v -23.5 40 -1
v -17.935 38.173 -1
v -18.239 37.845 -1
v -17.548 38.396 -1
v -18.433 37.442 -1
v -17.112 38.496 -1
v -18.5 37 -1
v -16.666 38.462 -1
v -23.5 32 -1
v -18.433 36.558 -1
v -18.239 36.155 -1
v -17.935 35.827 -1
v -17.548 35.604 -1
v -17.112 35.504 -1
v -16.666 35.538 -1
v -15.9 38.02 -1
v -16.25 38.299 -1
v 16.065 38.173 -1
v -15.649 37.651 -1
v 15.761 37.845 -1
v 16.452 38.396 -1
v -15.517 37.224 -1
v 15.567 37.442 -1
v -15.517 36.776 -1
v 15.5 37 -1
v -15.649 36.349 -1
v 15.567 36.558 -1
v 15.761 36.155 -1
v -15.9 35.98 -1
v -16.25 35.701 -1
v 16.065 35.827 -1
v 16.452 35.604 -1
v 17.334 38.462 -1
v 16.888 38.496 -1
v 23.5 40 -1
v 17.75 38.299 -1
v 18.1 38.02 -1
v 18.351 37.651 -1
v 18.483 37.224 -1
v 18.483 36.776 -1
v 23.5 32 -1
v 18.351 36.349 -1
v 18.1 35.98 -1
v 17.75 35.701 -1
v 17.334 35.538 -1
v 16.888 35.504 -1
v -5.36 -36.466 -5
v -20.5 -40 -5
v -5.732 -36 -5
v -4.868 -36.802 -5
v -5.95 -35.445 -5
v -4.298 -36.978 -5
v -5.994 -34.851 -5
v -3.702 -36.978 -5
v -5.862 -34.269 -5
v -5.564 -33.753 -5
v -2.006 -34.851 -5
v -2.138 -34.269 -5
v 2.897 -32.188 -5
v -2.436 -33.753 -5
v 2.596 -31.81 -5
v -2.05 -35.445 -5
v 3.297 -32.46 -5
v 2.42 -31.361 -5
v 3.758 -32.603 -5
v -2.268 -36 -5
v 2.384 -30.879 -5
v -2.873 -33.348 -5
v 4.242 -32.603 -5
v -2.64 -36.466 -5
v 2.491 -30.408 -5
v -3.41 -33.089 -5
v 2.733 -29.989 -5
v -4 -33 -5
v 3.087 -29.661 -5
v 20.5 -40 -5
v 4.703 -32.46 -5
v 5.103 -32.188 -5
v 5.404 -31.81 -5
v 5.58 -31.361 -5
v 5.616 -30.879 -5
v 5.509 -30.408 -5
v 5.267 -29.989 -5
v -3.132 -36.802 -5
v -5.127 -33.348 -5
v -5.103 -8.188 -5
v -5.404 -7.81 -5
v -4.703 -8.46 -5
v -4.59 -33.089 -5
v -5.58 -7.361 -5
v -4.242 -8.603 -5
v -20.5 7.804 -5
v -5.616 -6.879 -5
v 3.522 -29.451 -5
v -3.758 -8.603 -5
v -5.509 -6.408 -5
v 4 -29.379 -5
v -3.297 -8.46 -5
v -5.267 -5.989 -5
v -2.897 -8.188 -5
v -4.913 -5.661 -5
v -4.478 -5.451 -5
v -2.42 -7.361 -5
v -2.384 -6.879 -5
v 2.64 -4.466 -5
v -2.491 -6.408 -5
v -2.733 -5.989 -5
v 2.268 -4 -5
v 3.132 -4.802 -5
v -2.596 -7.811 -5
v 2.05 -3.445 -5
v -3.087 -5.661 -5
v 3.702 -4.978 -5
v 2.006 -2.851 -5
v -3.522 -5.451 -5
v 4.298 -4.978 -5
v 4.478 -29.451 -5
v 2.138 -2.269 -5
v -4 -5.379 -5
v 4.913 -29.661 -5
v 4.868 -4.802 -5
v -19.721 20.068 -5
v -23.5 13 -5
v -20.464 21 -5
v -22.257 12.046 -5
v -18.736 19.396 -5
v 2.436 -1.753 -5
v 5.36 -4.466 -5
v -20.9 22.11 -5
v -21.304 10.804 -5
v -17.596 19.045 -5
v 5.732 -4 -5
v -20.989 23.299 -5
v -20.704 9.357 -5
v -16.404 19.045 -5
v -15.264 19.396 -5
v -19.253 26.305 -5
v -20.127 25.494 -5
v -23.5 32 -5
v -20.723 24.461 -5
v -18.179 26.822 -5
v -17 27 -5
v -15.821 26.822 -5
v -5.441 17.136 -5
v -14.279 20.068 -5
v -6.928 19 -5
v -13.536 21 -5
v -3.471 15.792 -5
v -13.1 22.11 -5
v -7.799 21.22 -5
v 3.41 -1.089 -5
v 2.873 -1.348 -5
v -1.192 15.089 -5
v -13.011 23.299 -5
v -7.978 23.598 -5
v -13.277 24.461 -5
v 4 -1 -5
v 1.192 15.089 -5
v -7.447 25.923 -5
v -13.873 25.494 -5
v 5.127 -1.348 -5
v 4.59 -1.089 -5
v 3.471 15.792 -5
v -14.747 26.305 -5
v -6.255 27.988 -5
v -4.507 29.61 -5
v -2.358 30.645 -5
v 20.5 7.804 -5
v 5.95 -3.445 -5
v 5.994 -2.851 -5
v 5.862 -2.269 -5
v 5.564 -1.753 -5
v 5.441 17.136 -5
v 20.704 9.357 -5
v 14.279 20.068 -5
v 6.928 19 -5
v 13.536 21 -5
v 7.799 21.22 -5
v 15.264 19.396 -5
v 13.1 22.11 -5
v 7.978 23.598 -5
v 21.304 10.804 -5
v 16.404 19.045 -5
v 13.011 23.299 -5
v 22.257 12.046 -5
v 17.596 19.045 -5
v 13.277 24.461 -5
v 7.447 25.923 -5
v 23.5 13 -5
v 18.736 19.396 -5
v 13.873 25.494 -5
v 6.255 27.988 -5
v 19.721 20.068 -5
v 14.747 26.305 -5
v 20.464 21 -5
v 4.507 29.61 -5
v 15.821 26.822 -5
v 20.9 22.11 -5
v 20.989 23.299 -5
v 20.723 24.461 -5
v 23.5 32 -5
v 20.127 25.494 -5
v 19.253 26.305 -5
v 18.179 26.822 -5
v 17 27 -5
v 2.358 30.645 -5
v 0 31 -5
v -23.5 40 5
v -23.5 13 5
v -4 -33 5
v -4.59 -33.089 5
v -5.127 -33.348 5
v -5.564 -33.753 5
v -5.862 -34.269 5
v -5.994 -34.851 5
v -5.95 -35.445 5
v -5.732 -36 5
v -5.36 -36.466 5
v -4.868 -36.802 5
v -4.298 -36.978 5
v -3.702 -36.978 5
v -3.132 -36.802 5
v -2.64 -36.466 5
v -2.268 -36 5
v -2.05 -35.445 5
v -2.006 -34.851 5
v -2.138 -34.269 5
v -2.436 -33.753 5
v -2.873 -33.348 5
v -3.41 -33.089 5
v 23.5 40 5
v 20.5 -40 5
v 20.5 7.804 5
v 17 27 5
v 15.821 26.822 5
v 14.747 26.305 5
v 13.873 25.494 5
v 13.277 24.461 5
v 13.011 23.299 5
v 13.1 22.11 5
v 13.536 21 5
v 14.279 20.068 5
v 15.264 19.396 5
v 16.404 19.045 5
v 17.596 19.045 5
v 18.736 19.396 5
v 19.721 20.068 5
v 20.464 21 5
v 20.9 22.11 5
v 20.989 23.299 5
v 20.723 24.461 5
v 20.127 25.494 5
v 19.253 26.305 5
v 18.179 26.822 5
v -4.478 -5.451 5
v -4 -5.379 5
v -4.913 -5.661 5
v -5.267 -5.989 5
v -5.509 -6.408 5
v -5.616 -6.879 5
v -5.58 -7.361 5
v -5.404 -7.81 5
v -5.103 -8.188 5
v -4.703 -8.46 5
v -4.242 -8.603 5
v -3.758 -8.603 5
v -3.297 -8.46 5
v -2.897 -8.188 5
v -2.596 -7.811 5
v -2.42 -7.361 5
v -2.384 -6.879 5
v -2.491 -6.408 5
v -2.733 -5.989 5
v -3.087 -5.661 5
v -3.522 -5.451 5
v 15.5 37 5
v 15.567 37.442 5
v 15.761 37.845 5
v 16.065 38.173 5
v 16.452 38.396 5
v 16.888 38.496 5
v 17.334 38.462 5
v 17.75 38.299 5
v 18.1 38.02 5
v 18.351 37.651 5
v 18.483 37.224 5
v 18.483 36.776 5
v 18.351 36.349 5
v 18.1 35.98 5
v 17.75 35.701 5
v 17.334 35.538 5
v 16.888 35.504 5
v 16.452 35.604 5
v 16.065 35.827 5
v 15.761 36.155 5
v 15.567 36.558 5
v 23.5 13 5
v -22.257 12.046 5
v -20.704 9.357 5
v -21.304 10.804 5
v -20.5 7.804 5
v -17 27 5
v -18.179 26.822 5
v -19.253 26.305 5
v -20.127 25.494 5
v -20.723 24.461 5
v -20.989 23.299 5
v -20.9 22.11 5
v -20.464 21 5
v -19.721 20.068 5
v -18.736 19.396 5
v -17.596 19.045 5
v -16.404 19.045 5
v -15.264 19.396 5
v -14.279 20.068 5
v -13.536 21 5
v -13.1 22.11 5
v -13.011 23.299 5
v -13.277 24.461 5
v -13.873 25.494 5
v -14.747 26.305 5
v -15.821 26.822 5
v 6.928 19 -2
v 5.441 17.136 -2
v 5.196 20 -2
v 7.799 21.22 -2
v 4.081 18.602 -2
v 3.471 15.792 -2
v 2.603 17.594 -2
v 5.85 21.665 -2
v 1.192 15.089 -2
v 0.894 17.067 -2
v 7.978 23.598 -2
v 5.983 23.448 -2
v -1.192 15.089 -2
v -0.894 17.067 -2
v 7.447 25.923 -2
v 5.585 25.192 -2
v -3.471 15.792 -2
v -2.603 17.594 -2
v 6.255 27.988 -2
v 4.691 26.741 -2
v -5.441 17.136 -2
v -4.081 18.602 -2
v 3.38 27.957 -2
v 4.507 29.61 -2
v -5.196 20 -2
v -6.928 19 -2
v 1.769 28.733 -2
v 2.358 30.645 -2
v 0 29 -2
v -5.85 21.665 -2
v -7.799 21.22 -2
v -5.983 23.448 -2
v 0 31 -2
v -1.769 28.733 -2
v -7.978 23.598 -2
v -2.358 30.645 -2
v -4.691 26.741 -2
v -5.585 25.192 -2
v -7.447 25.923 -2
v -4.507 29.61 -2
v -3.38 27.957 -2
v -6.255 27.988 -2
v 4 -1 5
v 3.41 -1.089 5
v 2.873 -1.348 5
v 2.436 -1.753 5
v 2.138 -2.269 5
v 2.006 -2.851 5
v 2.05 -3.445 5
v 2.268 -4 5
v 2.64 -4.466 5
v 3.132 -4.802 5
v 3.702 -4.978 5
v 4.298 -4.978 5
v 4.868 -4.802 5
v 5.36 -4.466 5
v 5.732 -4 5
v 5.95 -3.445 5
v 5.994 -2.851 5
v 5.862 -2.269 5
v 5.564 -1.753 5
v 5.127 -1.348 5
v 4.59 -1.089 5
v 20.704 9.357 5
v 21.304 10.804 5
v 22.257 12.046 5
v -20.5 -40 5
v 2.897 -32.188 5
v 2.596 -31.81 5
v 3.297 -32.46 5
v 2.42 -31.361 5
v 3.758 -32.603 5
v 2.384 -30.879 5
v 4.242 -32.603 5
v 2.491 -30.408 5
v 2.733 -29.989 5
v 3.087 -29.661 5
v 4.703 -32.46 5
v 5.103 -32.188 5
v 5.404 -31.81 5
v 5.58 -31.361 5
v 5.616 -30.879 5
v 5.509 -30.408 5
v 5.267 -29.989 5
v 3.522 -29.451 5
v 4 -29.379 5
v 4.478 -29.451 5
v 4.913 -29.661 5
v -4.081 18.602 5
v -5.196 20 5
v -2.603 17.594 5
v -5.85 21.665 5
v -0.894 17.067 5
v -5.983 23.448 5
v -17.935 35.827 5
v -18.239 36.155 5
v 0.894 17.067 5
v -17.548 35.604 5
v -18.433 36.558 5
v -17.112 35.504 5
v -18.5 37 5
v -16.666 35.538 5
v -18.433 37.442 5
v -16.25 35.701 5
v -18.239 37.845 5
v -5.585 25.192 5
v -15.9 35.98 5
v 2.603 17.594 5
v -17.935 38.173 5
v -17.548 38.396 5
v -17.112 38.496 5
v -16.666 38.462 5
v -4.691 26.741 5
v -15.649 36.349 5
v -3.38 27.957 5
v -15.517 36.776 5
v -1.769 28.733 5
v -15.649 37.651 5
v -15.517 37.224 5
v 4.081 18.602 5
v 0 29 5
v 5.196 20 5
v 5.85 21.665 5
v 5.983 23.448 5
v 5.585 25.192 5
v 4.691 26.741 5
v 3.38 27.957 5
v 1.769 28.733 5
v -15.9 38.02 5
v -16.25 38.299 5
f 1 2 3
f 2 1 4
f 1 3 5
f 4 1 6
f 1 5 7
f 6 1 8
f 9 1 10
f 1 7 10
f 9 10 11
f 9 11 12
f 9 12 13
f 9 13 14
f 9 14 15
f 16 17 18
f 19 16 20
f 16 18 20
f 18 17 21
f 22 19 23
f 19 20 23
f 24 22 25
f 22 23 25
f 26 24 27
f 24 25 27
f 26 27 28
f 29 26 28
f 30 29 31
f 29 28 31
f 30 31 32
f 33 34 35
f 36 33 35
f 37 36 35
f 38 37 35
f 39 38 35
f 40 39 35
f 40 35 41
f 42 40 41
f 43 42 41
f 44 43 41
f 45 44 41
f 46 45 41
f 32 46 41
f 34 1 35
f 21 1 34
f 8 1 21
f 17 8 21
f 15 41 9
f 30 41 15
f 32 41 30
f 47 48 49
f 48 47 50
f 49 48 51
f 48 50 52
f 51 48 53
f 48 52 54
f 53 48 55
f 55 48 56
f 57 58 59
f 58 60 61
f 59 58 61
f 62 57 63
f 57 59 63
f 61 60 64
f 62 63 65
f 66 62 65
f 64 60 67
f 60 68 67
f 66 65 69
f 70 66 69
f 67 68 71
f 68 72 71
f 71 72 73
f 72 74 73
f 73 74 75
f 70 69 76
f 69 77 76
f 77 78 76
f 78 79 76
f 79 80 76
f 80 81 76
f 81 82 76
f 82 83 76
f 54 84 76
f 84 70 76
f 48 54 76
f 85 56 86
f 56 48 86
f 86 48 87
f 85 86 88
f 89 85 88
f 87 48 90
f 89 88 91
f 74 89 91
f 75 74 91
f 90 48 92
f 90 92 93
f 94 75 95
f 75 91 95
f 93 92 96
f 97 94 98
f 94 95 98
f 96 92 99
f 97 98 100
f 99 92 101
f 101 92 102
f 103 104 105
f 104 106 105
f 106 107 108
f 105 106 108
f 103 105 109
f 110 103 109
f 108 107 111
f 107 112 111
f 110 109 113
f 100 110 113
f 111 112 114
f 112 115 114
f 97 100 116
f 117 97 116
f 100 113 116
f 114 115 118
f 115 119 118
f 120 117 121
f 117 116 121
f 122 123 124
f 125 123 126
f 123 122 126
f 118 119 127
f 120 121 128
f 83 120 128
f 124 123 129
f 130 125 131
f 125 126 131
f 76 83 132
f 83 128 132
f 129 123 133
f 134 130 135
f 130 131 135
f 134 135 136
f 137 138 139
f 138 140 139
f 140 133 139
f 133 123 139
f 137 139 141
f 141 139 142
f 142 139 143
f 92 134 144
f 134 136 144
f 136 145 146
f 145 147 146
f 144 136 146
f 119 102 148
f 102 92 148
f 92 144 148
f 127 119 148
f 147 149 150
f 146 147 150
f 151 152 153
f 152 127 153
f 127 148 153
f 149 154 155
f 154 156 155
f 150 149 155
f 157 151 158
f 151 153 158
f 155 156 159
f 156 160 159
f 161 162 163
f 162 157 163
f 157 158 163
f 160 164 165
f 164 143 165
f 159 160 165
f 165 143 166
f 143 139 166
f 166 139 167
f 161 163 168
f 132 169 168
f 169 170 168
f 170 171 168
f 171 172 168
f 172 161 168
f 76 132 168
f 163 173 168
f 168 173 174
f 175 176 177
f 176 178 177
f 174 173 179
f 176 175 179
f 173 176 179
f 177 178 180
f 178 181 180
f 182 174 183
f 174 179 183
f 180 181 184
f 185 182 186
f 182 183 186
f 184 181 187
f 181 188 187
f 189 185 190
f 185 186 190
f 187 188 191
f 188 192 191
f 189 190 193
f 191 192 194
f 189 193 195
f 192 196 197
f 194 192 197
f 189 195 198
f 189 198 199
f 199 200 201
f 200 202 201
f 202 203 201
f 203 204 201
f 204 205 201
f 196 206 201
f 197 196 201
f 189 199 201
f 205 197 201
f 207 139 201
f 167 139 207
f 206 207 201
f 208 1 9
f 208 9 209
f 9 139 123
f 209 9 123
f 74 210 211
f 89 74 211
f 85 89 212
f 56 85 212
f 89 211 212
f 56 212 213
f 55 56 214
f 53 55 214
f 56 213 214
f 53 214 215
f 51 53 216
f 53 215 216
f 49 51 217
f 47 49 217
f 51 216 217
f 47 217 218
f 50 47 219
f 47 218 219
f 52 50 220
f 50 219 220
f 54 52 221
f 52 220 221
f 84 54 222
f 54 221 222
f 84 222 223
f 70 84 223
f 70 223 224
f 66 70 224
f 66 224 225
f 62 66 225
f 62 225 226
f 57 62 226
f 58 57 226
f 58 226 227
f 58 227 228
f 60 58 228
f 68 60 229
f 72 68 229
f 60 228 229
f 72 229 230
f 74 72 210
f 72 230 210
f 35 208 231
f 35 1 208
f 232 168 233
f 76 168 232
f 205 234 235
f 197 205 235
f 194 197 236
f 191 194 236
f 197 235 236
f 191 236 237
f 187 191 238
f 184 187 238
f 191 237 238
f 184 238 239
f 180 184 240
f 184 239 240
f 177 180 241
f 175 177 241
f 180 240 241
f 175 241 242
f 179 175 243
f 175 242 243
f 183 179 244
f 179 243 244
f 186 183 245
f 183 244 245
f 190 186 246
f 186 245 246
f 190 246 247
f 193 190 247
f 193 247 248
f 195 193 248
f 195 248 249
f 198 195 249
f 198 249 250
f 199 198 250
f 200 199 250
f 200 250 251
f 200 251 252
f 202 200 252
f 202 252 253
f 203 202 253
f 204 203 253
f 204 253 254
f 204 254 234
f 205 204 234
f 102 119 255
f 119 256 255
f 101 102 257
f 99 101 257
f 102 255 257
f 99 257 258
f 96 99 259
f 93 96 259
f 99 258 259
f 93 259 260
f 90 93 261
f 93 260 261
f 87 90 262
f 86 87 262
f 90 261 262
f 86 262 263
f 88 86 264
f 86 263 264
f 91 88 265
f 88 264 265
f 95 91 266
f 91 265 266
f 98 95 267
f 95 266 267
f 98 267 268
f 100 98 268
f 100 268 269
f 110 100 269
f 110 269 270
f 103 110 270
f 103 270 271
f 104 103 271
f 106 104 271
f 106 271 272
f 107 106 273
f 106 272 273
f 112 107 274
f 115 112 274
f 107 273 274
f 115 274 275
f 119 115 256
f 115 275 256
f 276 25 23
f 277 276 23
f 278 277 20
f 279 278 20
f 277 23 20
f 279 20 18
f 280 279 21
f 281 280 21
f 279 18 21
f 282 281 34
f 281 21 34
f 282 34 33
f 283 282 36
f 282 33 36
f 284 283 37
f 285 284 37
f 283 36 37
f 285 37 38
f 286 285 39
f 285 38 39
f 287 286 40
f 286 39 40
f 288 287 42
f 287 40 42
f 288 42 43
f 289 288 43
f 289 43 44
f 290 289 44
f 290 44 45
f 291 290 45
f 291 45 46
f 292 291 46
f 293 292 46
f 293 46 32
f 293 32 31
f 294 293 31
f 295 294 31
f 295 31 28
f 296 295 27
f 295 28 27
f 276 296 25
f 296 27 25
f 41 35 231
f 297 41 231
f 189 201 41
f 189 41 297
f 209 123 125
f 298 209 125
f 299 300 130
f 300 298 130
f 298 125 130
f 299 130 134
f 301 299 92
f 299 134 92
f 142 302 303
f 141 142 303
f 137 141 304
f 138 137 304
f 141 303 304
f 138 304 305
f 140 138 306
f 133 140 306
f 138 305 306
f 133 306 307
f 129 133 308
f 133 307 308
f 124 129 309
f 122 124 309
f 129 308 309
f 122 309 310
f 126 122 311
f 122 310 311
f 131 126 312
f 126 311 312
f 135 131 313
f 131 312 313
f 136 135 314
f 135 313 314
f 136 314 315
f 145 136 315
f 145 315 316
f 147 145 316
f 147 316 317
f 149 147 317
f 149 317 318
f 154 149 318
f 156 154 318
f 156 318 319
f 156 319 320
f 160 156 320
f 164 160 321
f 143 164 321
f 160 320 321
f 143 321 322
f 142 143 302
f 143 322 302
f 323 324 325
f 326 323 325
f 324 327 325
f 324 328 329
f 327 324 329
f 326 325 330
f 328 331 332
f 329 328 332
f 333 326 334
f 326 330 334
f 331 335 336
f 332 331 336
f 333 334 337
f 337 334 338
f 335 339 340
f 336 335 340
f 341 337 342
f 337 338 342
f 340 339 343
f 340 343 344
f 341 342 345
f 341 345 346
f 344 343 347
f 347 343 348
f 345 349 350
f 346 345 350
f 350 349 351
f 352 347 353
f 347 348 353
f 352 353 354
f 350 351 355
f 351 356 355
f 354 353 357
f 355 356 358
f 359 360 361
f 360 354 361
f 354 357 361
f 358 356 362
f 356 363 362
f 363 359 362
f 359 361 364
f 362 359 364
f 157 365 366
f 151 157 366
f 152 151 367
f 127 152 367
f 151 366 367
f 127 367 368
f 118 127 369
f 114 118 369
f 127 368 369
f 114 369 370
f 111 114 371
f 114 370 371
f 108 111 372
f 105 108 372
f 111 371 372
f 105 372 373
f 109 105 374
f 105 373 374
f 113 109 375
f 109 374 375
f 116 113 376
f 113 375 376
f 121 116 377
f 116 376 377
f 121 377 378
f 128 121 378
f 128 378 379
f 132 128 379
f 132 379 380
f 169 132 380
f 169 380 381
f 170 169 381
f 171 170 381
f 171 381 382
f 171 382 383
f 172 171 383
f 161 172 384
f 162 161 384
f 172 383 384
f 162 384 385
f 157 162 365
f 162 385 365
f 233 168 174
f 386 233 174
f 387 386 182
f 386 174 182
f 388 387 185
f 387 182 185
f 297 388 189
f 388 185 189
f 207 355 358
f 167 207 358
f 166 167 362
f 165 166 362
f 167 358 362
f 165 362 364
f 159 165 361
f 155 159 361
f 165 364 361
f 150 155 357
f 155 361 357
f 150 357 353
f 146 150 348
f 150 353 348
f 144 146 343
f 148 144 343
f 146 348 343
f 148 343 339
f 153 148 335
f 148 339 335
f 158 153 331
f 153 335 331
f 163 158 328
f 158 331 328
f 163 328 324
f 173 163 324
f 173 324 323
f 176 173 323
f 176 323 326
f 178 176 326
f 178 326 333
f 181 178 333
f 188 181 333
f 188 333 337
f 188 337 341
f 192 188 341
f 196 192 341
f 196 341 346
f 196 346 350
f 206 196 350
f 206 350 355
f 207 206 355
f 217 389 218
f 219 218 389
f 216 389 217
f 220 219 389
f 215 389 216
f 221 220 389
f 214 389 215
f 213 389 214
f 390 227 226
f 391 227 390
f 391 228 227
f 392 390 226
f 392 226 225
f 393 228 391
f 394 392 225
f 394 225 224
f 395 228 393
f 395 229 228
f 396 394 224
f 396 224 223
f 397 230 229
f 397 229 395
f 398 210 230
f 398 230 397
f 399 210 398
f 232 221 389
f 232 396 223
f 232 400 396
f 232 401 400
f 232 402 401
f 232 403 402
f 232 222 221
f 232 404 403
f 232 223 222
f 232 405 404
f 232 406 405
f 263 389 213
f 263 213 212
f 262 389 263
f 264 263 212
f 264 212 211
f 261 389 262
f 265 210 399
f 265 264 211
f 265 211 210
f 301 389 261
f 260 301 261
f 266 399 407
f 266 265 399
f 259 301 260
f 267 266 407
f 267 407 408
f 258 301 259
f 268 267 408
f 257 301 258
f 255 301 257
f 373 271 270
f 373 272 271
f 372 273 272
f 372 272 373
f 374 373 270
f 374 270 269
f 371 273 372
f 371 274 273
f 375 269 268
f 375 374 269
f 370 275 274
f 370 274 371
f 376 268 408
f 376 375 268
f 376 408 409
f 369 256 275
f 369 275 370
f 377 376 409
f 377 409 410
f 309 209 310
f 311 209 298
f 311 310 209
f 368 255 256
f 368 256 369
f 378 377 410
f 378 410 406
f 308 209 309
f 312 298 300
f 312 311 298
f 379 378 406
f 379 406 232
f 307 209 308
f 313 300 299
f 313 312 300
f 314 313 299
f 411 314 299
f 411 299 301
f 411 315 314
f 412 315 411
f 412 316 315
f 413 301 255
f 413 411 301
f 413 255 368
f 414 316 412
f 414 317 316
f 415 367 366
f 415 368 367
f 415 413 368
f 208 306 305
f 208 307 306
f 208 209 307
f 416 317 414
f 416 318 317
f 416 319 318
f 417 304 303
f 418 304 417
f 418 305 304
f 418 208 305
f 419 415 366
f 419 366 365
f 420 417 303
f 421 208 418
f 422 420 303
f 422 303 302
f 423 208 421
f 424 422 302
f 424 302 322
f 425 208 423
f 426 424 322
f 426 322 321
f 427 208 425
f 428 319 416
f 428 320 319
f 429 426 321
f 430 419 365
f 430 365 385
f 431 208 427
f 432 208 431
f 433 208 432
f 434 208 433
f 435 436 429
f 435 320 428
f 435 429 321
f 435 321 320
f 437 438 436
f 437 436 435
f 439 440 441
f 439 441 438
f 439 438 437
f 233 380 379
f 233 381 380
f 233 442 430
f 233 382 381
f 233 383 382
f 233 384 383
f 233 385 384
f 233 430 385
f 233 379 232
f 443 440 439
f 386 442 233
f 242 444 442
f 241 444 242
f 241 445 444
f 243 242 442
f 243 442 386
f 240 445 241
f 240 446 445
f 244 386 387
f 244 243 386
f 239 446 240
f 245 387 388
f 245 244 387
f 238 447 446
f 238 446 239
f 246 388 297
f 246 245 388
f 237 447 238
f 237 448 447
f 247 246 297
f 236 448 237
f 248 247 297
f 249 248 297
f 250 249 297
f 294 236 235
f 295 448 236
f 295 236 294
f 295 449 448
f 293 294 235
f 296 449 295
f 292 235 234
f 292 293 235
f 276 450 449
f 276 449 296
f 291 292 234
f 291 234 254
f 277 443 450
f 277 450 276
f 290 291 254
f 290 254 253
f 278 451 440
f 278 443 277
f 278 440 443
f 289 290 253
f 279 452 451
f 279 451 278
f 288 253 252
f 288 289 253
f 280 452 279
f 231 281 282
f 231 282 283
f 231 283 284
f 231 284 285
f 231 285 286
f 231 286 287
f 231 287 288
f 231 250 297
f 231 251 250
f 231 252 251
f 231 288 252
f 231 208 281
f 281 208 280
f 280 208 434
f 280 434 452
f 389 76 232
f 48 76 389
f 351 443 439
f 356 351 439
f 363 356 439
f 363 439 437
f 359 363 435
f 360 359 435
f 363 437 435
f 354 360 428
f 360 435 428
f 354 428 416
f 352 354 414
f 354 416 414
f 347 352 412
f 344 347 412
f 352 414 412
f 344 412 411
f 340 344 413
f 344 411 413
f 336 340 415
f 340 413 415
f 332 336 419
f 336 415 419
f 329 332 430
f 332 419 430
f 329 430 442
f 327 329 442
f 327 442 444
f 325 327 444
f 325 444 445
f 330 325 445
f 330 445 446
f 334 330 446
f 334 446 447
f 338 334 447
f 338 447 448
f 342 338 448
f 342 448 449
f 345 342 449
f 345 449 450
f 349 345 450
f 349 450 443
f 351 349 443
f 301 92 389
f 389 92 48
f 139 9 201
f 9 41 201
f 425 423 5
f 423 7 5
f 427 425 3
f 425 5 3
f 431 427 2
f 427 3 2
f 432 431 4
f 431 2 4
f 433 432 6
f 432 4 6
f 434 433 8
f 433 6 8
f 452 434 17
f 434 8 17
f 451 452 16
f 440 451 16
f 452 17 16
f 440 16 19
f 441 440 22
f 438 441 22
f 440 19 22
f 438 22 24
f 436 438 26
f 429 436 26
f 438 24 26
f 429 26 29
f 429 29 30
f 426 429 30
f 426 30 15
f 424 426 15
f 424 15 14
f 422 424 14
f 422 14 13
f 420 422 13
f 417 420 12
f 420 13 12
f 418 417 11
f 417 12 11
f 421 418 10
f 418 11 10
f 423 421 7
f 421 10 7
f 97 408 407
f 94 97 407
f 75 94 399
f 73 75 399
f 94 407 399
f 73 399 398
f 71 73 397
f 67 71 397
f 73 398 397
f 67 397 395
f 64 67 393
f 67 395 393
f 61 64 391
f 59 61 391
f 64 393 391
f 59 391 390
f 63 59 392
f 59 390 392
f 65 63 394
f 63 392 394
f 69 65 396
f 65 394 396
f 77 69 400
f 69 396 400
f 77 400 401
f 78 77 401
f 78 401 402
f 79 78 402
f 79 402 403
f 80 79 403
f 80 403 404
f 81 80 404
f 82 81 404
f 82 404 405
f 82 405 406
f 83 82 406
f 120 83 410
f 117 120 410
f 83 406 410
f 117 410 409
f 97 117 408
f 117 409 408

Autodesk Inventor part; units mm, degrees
ref_plane "YZ Plane" through (0, 0, 0) normal (1, 0, 0) x (0, 1, 0)
ref_plane "XZ Plane" through (0, 0, 0) normal (0, 1, 0) x (-1, 0, 0)
ref_plane "XY Plane" through (0, 0, 0) normal (0, 0, 1) x (1, 0, 0)
sketch "Sketch1" plane through (0, 0, 0) normal (0, 0, 1) x (1, 0, 0)
  line L0 (0, 40) -> (0, -40)
  line L1 (0, 40) -> (23.5, 40)
  line L2 (23.5, 40) -> (23.5, 13)
  arc A0 (23.5, 13) -> (20.5, 7.8038) centre (26.5, 7.8038) ccw
  line L3 (20.5, 7.8038) -> (20.5, -40)
  line L4 (20.5, -40) -> (0, -40)
  line L5 (0, 40) -> (-23.5, 40)
  line L6 (-23.5, 40) -> (-23.5, 13)
  arc A1 (-20.5, 7.8038) -> (-23.5, 13) centre (-26.5, 7.8038) ccw
  line L7 (-20.5, 7.8038) -> (-20.5, -40)
  line L8 (-20.5, -40) -> (0, -40)
  point P0 (0, 0)
  point P1 (0, 0)
  point P2 (10.25, -40)
  dimension "d0" = 47
  dimension "d1" = 80
  dimension "d2" = 27
  dimension "d3" = 41
  dimension "d4" = 6
extrude "Extrusion1" add sketch "Sketch1" along normal mid plane 10
sketch "Sketch2" plane through (23.5, 13, 5) normal (1, 0, 0) x (0, 0, -1)
  line L0 (10, 27) -> (0, 27) projected
  line L1 (6, 27) -> (6, 19)
  line L2 (6, 19) -> (10, 19)
  line L3 (10, 27) -> (10, 0) projected
  point P0 (5, -13)
  dimension "d7" = 8
  dimension "d8" = 4
extrude "Extrusion2" cut sketch "Sketch2" against normal through all
sketch "Sketch3" plane through (0, 0, -5) normal (0, 0, -1) x (-1, 0, 0)
  line L0 (-23.5, 40) -> (23.5, 40) projected
  line L1 (0, 40) -> (0, -40)
  line L2 (-20.5, -40) -> (20.5, -40) projected
  line L3 (-20.5, 7.8038) -> (-20.5, -40) projected
  point P0 (0, 0)
  point P1 (-17, 23)
  point P2 (0, 23)
  point P3 (17, 23)
  point P4 (-4, -3)
  point P5 (4, -7)
  point P6 (-4, -31)
  point P7 (4, -35)
  dimension "d11" = 17
  dimension "d12" = 34
  dimension "d13" = 5
  dimension "d14" = 32
  dimension "d15" = 4
  dimension "d16" = 24
  dimension "d17" = 16.5
  dimension "d18" = 24.5
hole "Hole1" at (-4, -35, -5) at (4, -3, -5) direction (0, 0, 1) diameter 4 end through all
hole "Hole2" at (4, -31, -5) at (-4, -7, -5) direction (0, 0, 1) diameter 3.242 end through all thread size "M4x0.7" class "6H" standard "ISO Metric profile"
hole "Hole3" at (17, 23, -5) at (-17, 23, -5) direction (0, 0, 1) diameter 8 end through all
hole "Hole4" at (0, 23, -5) direction (0, 0, 1) diameter 12 end through all counterbore diameter 16 counterbore depth 3
sketch "Sketch5" plane through (23.5, 32, -1) normal (0, 0, -1) x (-1, 0, 0)
  line L0 (0, 8) -> (47, 8) projected
  line L1 (23.5, 8) -> (23.5, 5)
  line L2 (23.5, 5) -> (40.5, 5)
  line L3 (40.5, 5) -> (6.5, 5)
  circle A0 centre (6.5, 5) radius 1.5
  circle A1 centre (40.5, 5) radius 1.5
  point P0 (23.5, -32)
  dimension "d58" = 3
  dimension "d59" = 17
  dimension "d60" = 34
  dimension "d61" = 3
  dimension "d62" = 3
extrude "Extrusion4" cut sketch "Sketch5" against normal blind 10
properties part number "Lap2" material "Steel, Carbon"
